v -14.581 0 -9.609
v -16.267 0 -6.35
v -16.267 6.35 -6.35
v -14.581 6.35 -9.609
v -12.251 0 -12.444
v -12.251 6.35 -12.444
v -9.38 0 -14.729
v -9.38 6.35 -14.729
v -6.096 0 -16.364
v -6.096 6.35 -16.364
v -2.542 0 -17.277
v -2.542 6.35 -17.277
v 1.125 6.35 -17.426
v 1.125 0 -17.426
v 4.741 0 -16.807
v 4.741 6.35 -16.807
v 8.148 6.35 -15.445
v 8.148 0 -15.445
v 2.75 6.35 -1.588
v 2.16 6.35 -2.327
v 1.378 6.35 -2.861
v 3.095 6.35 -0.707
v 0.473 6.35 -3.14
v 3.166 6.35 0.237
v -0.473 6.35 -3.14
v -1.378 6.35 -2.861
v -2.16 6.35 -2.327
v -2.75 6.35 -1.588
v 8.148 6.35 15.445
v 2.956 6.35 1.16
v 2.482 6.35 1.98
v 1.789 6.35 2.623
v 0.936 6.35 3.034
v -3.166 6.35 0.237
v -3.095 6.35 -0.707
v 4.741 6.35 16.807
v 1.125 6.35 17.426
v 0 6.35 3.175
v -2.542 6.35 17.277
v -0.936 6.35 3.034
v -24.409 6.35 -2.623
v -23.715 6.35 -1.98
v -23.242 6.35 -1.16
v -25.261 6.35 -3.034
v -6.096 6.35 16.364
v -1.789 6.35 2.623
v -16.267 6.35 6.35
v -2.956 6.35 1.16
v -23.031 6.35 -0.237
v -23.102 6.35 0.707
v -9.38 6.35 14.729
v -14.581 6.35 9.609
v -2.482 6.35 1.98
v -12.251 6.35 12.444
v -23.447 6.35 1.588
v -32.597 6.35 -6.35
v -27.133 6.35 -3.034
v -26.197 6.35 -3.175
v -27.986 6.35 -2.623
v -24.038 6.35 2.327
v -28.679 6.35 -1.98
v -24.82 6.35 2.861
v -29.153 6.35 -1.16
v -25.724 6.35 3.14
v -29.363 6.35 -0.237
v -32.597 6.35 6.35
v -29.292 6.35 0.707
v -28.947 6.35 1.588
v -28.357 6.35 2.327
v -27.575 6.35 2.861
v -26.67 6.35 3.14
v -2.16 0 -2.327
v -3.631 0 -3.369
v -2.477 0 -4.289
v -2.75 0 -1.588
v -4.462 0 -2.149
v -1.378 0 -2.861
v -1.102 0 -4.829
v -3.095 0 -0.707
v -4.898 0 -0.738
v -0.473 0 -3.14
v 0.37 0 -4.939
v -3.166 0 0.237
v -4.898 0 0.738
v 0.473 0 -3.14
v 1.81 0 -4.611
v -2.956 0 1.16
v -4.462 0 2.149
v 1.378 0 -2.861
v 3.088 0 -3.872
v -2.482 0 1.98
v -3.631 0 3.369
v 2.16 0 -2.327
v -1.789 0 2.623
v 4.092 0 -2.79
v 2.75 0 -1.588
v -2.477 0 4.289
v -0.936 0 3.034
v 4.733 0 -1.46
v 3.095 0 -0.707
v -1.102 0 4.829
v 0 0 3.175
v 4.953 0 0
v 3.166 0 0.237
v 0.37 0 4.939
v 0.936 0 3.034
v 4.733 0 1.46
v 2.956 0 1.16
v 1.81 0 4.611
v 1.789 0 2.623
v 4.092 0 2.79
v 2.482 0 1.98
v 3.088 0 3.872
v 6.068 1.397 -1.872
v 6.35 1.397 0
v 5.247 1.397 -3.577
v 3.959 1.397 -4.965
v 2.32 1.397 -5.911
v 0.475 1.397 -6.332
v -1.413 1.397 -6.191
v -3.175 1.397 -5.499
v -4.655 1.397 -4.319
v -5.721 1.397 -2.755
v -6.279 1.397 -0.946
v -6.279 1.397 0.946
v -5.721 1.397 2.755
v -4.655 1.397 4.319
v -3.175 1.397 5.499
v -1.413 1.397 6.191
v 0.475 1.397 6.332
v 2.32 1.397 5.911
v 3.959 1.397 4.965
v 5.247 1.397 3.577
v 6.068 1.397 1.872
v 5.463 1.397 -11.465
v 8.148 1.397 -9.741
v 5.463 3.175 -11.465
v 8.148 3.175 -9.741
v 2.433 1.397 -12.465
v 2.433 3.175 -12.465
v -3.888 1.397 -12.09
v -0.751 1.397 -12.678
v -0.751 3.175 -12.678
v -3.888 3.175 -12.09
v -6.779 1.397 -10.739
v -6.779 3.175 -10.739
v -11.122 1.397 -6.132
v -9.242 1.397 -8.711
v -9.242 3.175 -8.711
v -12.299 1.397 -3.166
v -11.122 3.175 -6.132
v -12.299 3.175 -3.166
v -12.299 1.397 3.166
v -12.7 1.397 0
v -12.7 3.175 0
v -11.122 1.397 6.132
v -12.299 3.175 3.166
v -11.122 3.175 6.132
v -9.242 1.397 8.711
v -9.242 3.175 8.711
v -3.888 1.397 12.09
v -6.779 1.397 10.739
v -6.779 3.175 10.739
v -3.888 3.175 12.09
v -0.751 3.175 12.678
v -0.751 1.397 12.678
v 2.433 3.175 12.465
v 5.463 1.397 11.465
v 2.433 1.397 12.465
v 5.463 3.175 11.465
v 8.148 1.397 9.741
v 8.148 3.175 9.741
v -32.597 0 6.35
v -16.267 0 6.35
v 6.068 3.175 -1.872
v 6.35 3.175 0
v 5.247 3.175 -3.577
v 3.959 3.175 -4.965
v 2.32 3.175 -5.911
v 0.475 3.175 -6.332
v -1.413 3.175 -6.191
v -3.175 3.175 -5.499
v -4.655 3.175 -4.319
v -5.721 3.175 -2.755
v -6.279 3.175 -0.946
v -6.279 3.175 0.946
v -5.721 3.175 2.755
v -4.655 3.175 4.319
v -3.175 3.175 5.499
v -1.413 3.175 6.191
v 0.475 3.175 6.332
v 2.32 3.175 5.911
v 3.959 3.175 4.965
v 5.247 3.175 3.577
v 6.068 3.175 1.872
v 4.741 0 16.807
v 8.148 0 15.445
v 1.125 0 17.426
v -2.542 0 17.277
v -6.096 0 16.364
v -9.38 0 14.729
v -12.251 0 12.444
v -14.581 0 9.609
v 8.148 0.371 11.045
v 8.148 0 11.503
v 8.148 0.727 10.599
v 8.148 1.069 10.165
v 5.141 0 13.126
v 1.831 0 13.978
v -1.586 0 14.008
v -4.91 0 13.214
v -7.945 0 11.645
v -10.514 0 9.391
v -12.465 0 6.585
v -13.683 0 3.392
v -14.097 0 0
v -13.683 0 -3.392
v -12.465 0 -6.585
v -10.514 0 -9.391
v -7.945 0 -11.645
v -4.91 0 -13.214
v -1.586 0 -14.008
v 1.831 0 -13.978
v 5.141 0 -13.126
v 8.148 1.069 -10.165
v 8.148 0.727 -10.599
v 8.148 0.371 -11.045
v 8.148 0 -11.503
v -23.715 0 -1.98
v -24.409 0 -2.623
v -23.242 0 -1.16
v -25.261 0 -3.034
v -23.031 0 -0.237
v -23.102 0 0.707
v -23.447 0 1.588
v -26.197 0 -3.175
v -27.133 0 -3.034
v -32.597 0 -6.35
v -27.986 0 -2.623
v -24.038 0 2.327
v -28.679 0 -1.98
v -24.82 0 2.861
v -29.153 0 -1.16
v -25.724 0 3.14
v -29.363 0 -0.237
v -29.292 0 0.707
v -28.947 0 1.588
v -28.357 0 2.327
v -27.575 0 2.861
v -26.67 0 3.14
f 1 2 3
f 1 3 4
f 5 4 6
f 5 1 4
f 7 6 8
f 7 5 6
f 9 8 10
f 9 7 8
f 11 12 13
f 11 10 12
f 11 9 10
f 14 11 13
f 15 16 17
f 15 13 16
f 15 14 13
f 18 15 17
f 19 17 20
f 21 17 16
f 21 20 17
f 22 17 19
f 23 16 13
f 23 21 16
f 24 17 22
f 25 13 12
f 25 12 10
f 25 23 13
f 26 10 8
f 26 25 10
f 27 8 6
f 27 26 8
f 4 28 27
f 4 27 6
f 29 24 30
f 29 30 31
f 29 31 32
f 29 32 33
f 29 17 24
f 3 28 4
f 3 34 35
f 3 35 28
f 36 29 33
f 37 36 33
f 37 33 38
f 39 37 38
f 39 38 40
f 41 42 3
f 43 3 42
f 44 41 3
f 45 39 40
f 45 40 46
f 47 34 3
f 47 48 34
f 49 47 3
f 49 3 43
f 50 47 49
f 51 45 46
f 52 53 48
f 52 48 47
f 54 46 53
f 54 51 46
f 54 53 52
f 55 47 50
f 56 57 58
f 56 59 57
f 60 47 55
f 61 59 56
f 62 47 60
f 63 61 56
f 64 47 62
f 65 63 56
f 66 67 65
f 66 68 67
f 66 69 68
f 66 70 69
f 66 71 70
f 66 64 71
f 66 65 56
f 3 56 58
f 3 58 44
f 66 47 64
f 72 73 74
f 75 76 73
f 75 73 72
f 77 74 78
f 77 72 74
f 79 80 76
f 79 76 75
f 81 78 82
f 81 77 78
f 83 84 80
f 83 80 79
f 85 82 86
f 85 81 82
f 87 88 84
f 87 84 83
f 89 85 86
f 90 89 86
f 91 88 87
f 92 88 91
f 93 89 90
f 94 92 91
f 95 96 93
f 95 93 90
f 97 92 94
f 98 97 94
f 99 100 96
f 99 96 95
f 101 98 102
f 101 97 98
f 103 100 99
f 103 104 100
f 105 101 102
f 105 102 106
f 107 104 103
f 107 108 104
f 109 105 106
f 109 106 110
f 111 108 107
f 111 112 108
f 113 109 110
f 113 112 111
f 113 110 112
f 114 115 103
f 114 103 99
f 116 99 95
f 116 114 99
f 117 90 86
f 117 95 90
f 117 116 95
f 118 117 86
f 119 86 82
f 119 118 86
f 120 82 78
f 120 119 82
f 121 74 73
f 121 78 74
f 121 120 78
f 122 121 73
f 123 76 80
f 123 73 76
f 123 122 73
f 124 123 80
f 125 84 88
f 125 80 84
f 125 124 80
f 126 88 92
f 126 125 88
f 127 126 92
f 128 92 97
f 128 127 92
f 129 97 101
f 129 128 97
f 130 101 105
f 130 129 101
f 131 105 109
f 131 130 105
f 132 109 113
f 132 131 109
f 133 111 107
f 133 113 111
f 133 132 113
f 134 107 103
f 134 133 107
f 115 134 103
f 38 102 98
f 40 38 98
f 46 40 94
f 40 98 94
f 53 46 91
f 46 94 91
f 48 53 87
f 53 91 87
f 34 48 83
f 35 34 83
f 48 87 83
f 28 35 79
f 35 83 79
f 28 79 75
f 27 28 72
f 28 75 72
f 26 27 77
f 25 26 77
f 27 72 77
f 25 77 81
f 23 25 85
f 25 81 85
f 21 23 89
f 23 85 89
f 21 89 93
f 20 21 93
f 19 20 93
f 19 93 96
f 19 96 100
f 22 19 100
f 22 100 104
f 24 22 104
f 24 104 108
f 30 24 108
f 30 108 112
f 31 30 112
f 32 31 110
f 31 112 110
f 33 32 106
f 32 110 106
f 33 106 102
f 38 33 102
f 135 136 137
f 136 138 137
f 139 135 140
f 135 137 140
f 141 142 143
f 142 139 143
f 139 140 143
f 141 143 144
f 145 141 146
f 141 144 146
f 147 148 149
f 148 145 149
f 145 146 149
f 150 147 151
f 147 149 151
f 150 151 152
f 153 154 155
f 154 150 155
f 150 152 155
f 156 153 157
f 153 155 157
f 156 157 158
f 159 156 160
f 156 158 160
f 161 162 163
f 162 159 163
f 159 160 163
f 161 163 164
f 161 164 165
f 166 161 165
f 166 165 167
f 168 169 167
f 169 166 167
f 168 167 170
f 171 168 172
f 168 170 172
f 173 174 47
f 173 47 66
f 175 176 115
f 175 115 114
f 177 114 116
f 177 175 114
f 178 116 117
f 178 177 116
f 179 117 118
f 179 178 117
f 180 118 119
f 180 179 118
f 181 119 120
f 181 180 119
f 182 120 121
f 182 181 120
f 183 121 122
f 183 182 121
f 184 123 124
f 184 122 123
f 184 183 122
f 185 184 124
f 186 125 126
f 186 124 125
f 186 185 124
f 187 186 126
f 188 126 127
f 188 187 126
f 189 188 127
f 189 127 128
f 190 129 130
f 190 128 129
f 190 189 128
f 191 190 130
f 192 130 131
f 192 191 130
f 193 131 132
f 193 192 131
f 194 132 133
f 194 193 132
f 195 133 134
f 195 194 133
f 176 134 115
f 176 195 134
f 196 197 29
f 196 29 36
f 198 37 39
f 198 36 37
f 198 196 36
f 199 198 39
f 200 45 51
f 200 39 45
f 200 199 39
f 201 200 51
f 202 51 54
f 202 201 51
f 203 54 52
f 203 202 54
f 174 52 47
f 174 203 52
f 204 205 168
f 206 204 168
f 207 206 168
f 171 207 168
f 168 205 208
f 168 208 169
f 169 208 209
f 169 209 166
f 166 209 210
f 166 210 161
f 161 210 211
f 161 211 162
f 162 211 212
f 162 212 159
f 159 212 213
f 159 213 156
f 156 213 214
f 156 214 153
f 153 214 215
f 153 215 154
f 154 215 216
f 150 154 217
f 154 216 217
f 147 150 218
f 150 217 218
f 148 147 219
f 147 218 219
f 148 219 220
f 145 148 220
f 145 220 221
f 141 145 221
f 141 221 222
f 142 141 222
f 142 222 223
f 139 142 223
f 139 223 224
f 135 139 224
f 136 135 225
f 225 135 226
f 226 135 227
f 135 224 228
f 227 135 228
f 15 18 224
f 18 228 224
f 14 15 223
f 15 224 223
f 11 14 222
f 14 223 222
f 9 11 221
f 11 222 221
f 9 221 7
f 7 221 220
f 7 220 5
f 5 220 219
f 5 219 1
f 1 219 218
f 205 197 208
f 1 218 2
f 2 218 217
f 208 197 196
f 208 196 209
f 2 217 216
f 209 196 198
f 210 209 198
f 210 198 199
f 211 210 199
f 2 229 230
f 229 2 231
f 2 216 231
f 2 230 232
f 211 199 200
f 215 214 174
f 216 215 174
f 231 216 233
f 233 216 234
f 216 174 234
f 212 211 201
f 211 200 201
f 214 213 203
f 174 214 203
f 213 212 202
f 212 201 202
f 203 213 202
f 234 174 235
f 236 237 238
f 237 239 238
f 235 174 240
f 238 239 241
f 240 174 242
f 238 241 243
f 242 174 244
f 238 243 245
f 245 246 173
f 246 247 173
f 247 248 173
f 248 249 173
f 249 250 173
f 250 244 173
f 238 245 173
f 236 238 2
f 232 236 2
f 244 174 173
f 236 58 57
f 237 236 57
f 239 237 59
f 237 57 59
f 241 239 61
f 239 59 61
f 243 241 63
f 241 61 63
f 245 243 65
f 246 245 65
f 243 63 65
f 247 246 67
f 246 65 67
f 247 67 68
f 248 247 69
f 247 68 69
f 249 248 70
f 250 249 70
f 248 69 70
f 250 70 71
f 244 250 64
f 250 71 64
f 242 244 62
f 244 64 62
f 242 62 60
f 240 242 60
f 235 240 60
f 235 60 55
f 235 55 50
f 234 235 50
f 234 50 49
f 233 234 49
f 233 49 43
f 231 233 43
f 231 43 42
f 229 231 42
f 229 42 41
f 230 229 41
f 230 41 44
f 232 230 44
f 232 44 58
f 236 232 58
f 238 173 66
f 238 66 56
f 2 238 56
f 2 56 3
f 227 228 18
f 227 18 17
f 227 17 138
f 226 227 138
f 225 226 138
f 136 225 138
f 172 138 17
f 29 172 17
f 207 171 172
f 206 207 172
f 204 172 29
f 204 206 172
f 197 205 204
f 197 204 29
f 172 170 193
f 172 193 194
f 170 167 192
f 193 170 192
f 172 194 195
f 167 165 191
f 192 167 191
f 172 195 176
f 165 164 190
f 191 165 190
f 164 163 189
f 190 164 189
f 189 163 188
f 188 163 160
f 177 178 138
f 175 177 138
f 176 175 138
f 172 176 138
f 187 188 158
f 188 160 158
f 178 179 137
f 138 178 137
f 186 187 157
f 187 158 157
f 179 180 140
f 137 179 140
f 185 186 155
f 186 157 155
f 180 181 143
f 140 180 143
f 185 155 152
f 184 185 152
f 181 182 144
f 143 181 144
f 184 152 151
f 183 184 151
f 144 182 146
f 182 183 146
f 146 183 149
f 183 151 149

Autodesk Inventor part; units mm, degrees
ref_plane "YZ Plane" through (0, 0, 0) normal (1, 0, 0) x (0, 1, 0)
ref_plane "XZ Plane" through (0, 0, 0) normal (0, 1, 0) x (-1, 0, 0)
ref_plane "XY Plane" through (0, 0, 0) normal (0, 0, 1) x (1, 0, 0)
sketch "SketchCircles" plane through (0, 0, 0) normal (0, 1, 0) x (-1, 0, 0)
  circle A0 centre (0, 0) radius 12.7
  circle A1 centre (0, 0) radius 6.35
  line L0 (32.5969, -6.35) -> (16.267, -6.35)
  line L1 (16.267, 6.35) -> (32.5969, 6.35)
  line L2 (32.5969, 6.35) -> (32.5969, -6.35)
  line L3 (32.5969, -6.35) -> (15.4107, 6.35) construction
  line L4 (15.4107, -6.35) -> (32.5969, 6.35) construction
  arc A2 (16.267, 6.35) -> (16.267, -6.35) centre (0, 0) ccw
  point P0 (24.0038, 0)
  dimension "d0" = 25.4
  dimension "d1" = 12.7
extrude "Extrusion100" add sketch "SketchCircles" along normal blind 6.35 contours A0 | A1 | L0 A2 L1 L2
sketch "SketchLines" plane through (0, 0, 0) normal (0, -1, 0) x (1, 0, 0)
  line L0 (-17.7365, 0) -> (17.5532, 0)
  line L1 (-0.0917, 17.7823) -> (-0.0917, -17.324)
  point P0 (0, 0)
hole "Hole1" at (0, 0, 0) direction (0, 1, 0) diameter 25.4 depth 3.175
sketch "Sketch3" plane through (0, 3.175, 0) normal (0, -1, 0) x (1, 0, 0)
  circle A0 centre (0, 0) radius 6.35
  dimension "d12" = 12.7
extrude "Extrusion2" add sketch "Sketch3" along normal blind 3.175
chamfer "Chamfer1" distance 1.397 angle 45 1 edges at (0, 0, 12.7)
chamfer "Chamfer2" distance 1.397 angle 45 1 edges at (-6.35, 0, 0)
sketch "Sketch4" plane through (0, 6.35, 0) normal (0, 1, 0) x (1, 0, 0)
  circle A0 centre (0, 0) radius 3.9688
  point P0 (0, 0)
  dimension "d21" = 7.9375
hole "Hole2" at (0, 6.35, 0) direction (0, -1, 0) diameter 6.35 depth 12.7
sketch "Sketch5" plane through (0, 0, 0) normal (0, -1, 0) x (1, 0, 0)
  line L0 (-18.8474, 0) -> (20.3869, 0)
  circle A0 centre (0, 0) radius 6.35 projected
  line L1 (-18.8474, 0) -> (-26.1971, 0)
  line L2 (8.1484, 0) -> (8.1484, 20.5164)
  point P0 (0, 0)
  point P1 (6.35, 0)
hole "Hole3" at (-26.1971, 0, 0) direction (0, 1, 0) diameter 6.35 end through all
ref_plane "Work Plane4" through (8.1484, 0, 0) normal (1, 0, 0) x (0, 0, 1)
split "Split2" plane through (8.1484, 0, 0) removes the side toward (1, 0, 0)
properties part number "tiedown-hook-mount-clip"
